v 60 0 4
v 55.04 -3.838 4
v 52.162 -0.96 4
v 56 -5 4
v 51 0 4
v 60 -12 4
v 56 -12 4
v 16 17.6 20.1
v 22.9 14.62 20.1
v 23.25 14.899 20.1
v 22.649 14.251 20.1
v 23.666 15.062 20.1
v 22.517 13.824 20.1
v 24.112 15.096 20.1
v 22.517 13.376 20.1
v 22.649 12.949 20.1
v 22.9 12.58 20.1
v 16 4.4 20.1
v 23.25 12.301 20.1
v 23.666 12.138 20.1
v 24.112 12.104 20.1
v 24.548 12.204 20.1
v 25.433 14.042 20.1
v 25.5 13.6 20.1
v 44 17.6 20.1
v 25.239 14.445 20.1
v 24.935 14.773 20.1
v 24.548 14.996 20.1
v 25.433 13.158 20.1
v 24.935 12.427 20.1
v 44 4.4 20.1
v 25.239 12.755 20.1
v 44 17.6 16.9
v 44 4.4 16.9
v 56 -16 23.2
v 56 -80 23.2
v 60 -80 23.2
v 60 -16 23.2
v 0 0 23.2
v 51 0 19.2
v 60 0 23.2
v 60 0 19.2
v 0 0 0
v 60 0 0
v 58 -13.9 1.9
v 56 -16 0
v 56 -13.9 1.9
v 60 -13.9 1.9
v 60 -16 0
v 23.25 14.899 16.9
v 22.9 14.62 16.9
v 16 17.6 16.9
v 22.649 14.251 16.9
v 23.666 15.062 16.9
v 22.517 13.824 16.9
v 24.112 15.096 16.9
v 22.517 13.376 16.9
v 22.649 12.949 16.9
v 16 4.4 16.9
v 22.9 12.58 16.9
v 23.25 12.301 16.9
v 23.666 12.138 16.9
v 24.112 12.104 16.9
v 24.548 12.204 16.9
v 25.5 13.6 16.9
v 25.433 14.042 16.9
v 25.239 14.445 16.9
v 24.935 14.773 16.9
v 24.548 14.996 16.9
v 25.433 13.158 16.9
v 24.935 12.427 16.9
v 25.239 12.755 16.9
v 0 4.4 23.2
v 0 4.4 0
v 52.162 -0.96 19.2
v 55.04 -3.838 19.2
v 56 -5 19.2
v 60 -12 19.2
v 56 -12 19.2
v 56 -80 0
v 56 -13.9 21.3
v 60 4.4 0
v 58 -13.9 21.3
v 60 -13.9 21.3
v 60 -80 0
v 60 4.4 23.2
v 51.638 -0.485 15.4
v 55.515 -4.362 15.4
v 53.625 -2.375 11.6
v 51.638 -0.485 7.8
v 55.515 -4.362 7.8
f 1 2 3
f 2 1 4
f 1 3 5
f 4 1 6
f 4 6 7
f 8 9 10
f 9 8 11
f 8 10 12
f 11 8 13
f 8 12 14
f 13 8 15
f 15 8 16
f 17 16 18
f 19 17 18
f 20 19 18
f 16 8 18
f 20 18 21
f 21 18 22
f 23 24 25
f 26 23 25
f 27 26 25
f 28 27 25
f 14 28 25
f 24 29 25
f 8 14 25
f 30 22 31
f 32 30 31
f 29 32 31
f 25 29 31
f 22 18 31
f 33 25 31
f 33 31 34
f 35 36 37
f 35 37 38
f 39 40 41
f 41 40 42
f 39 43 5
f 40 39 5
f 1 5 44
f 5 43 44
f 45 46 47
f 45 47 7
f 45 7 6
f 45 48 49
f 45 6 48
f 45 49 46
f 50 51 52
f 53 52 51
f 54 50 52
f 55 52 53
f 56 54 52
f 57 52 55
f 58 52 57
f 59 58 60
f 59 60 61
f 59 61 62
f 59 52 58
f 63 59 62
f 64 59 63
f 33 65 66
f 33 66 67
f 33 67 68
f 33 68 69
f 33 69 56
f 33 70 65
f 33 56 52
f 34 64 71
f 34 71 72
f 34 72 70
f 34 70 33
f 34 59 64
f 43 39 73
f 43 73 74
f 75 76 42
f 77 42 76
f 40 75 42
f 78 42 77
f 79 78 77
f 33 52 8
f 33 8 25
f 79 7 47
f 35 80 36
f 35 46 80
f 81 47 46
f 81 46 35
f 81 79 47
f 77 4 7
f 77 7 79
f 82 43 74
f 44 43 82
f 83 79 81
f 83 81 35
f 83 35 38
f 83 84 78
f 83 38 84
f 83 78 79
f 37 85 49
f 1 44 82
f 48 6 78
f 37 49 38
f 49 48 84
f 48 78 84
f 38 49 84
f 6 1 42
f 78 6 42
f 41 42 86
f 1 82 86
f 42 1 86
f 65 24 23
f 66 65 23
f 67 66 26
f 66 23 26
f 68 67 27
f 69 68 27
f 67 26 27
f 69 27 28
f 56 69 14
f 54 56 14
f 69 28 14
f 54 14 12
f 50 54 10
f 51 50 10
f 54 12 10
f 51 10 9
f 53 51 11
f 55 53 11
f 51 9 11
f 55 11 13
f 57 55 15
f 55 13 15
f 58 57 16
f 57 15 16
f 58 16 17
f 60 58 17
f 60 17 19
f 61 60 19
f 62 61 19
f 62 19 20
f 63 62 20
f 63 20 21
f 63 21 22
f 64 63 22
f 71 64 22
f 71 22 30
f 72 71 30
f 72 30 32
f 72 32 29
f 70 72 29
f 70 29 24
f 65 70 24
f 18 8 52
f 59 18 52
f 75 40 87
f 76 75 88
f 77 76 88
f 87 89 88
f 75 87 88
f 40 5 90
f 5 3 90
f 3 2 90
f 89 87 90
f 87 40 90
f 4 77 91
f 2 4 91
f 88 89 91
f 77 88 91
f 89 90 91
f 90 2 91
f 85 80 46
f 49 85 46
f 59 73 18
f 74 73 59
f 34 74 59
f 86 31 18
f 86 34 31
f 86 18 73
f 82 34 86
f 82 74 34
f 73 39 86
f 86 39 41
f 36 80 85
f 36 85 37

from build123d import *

# Parameters (mm, degrees)
SKETCH1_W           = 60
SKETCH1_H           = 23.2
BOSS_EXTRUDE1_DEPTH = 4.4
SKETCH2_W           = 28
SKETCH2_H           = 3.2
BOSS_EXTRUDE2_DEPTH = 13.2
SKETCH3_W           = 4
SKETCH3_H           = 15.2
BOSS_EXTRUDE3_DEPTH = 80
SKETCH4_W           = 4
SKETCH4_H           = 68
BOSS_EXTRUDE4_DEPTH = 4
FILLET1_SIZE        = 5
FILLET2_SIZE        = 4
SKETCH5_R           = 1.5
CUT_EXTRUDE1_DEPTH  = 10


with BuildPart() as part:
    # Sketch1 → Boss-Extrude1 (new body)
    with BuildSketch(Plane(origin=(0, 0, 0), x_dir=(1, 0, 0), z_dir=(0, 1, 0))):
        with Locations((30, -11.6)):
            Rectangle(SKETCH1_W, SKETCH1_H)
    extrude(amount=BOSS_EXTRUDE1_DEPTH)

    # Sketch2 → Boss-Extrude2 (add)
    with BuildSketch(Plane(origin=(0, 4.4, 0), x_dir=(1, 0, 0), z_dir=(0, 1, 0))):
        with Locations((30, -18.5)):
            Rectangle(SKETCH2_W, SKETCH2_H)
    extrude(amount=BOSS_EXTRUDE2_DEPTH)

    # Sketch3 → Boss-Extrude3 (add)
    with BuildSketch(Plane(origin=(0, 0, 0), x_dir=(-1, 0, 0), z_dir=(0, -1, 0))):
        with Locations((-58, -11.6)):
            Rectangle(SKETCH3_W, SKETCH3_H)
    extrude(amount=BOSS_EXTRUDE3_DEPTH)

    # Sketch4 → Boss-Extrude4 (add)
    with BuildSketch(Plane.ZY.offset(-56)):
        with Locations((21.2, -46)):
            Rectangle(SKETCH4_W, SKETCH4_H)
        with Locations((2, -46)):
            Rectangle(SKETCH4_W, SKETCH4_H)
    extrude(amount=-BOSS_EXTRUDE4_DEPTH)

    # Fillet1
    # a fillet whose section is not a circle: 5 mm, written as the material it adds along each edge
    with BuildSketch(Plane(origin=(56, 0, 4), x_dir=(-1, 0, 0), z_dir=(0, 0, 1))) as fillet1_piece_1:
        with BuildLine():
            Bezier((FILLET1_SIZE, 0), (0, 0), (0, FILLET1_SIZE), weights=[1, 0.052631579, 1])
            Line((0, FILLET1_SIZE), (0, 0))
            Line((0, 0), (FILLET1_SIZE, 0))
        make_face()
    extrude(amount=15.2)

    # Fillet2
    # a fillet whose section is not a circle: 4 mm, written as the material it takes off along each edge
    with BuildSketch(Plane(origin=(46, -12, 0), x_dir=(0, 0, 1), z_dir=(1, 0, 0)), Plane(origin=(46, -12, 23.2), x_dir=(0, -1, 0), z_dir=(1, 0, 0))) as fillet2_piece_1:
        with BuildLine():
            Bezier((FILLET2_SIZE, 0), (0, 0), (0, FILLET2_SIZE), weights=[1, 0.052631579, 1])
            Line((0, FILLET2_SIZE), (0, 0))
            Line((0, 0), (FILLET2_SIZE, 0))
        make_face()
    extrude(amount=24, mode=Mode.SUBTRACT)

    # Sketch5 → Cut-Extrude1 (cut)
    with BuildSketch(Plane.XY.offset(20.1)):
        with Locations((24, 13.6)):
            Circle(SKETCH5_R)
    extrude(amount=-CUT_EXTRUDE1_DEPTH, mode=Mode.SUBTRACT)


solid = part.part
